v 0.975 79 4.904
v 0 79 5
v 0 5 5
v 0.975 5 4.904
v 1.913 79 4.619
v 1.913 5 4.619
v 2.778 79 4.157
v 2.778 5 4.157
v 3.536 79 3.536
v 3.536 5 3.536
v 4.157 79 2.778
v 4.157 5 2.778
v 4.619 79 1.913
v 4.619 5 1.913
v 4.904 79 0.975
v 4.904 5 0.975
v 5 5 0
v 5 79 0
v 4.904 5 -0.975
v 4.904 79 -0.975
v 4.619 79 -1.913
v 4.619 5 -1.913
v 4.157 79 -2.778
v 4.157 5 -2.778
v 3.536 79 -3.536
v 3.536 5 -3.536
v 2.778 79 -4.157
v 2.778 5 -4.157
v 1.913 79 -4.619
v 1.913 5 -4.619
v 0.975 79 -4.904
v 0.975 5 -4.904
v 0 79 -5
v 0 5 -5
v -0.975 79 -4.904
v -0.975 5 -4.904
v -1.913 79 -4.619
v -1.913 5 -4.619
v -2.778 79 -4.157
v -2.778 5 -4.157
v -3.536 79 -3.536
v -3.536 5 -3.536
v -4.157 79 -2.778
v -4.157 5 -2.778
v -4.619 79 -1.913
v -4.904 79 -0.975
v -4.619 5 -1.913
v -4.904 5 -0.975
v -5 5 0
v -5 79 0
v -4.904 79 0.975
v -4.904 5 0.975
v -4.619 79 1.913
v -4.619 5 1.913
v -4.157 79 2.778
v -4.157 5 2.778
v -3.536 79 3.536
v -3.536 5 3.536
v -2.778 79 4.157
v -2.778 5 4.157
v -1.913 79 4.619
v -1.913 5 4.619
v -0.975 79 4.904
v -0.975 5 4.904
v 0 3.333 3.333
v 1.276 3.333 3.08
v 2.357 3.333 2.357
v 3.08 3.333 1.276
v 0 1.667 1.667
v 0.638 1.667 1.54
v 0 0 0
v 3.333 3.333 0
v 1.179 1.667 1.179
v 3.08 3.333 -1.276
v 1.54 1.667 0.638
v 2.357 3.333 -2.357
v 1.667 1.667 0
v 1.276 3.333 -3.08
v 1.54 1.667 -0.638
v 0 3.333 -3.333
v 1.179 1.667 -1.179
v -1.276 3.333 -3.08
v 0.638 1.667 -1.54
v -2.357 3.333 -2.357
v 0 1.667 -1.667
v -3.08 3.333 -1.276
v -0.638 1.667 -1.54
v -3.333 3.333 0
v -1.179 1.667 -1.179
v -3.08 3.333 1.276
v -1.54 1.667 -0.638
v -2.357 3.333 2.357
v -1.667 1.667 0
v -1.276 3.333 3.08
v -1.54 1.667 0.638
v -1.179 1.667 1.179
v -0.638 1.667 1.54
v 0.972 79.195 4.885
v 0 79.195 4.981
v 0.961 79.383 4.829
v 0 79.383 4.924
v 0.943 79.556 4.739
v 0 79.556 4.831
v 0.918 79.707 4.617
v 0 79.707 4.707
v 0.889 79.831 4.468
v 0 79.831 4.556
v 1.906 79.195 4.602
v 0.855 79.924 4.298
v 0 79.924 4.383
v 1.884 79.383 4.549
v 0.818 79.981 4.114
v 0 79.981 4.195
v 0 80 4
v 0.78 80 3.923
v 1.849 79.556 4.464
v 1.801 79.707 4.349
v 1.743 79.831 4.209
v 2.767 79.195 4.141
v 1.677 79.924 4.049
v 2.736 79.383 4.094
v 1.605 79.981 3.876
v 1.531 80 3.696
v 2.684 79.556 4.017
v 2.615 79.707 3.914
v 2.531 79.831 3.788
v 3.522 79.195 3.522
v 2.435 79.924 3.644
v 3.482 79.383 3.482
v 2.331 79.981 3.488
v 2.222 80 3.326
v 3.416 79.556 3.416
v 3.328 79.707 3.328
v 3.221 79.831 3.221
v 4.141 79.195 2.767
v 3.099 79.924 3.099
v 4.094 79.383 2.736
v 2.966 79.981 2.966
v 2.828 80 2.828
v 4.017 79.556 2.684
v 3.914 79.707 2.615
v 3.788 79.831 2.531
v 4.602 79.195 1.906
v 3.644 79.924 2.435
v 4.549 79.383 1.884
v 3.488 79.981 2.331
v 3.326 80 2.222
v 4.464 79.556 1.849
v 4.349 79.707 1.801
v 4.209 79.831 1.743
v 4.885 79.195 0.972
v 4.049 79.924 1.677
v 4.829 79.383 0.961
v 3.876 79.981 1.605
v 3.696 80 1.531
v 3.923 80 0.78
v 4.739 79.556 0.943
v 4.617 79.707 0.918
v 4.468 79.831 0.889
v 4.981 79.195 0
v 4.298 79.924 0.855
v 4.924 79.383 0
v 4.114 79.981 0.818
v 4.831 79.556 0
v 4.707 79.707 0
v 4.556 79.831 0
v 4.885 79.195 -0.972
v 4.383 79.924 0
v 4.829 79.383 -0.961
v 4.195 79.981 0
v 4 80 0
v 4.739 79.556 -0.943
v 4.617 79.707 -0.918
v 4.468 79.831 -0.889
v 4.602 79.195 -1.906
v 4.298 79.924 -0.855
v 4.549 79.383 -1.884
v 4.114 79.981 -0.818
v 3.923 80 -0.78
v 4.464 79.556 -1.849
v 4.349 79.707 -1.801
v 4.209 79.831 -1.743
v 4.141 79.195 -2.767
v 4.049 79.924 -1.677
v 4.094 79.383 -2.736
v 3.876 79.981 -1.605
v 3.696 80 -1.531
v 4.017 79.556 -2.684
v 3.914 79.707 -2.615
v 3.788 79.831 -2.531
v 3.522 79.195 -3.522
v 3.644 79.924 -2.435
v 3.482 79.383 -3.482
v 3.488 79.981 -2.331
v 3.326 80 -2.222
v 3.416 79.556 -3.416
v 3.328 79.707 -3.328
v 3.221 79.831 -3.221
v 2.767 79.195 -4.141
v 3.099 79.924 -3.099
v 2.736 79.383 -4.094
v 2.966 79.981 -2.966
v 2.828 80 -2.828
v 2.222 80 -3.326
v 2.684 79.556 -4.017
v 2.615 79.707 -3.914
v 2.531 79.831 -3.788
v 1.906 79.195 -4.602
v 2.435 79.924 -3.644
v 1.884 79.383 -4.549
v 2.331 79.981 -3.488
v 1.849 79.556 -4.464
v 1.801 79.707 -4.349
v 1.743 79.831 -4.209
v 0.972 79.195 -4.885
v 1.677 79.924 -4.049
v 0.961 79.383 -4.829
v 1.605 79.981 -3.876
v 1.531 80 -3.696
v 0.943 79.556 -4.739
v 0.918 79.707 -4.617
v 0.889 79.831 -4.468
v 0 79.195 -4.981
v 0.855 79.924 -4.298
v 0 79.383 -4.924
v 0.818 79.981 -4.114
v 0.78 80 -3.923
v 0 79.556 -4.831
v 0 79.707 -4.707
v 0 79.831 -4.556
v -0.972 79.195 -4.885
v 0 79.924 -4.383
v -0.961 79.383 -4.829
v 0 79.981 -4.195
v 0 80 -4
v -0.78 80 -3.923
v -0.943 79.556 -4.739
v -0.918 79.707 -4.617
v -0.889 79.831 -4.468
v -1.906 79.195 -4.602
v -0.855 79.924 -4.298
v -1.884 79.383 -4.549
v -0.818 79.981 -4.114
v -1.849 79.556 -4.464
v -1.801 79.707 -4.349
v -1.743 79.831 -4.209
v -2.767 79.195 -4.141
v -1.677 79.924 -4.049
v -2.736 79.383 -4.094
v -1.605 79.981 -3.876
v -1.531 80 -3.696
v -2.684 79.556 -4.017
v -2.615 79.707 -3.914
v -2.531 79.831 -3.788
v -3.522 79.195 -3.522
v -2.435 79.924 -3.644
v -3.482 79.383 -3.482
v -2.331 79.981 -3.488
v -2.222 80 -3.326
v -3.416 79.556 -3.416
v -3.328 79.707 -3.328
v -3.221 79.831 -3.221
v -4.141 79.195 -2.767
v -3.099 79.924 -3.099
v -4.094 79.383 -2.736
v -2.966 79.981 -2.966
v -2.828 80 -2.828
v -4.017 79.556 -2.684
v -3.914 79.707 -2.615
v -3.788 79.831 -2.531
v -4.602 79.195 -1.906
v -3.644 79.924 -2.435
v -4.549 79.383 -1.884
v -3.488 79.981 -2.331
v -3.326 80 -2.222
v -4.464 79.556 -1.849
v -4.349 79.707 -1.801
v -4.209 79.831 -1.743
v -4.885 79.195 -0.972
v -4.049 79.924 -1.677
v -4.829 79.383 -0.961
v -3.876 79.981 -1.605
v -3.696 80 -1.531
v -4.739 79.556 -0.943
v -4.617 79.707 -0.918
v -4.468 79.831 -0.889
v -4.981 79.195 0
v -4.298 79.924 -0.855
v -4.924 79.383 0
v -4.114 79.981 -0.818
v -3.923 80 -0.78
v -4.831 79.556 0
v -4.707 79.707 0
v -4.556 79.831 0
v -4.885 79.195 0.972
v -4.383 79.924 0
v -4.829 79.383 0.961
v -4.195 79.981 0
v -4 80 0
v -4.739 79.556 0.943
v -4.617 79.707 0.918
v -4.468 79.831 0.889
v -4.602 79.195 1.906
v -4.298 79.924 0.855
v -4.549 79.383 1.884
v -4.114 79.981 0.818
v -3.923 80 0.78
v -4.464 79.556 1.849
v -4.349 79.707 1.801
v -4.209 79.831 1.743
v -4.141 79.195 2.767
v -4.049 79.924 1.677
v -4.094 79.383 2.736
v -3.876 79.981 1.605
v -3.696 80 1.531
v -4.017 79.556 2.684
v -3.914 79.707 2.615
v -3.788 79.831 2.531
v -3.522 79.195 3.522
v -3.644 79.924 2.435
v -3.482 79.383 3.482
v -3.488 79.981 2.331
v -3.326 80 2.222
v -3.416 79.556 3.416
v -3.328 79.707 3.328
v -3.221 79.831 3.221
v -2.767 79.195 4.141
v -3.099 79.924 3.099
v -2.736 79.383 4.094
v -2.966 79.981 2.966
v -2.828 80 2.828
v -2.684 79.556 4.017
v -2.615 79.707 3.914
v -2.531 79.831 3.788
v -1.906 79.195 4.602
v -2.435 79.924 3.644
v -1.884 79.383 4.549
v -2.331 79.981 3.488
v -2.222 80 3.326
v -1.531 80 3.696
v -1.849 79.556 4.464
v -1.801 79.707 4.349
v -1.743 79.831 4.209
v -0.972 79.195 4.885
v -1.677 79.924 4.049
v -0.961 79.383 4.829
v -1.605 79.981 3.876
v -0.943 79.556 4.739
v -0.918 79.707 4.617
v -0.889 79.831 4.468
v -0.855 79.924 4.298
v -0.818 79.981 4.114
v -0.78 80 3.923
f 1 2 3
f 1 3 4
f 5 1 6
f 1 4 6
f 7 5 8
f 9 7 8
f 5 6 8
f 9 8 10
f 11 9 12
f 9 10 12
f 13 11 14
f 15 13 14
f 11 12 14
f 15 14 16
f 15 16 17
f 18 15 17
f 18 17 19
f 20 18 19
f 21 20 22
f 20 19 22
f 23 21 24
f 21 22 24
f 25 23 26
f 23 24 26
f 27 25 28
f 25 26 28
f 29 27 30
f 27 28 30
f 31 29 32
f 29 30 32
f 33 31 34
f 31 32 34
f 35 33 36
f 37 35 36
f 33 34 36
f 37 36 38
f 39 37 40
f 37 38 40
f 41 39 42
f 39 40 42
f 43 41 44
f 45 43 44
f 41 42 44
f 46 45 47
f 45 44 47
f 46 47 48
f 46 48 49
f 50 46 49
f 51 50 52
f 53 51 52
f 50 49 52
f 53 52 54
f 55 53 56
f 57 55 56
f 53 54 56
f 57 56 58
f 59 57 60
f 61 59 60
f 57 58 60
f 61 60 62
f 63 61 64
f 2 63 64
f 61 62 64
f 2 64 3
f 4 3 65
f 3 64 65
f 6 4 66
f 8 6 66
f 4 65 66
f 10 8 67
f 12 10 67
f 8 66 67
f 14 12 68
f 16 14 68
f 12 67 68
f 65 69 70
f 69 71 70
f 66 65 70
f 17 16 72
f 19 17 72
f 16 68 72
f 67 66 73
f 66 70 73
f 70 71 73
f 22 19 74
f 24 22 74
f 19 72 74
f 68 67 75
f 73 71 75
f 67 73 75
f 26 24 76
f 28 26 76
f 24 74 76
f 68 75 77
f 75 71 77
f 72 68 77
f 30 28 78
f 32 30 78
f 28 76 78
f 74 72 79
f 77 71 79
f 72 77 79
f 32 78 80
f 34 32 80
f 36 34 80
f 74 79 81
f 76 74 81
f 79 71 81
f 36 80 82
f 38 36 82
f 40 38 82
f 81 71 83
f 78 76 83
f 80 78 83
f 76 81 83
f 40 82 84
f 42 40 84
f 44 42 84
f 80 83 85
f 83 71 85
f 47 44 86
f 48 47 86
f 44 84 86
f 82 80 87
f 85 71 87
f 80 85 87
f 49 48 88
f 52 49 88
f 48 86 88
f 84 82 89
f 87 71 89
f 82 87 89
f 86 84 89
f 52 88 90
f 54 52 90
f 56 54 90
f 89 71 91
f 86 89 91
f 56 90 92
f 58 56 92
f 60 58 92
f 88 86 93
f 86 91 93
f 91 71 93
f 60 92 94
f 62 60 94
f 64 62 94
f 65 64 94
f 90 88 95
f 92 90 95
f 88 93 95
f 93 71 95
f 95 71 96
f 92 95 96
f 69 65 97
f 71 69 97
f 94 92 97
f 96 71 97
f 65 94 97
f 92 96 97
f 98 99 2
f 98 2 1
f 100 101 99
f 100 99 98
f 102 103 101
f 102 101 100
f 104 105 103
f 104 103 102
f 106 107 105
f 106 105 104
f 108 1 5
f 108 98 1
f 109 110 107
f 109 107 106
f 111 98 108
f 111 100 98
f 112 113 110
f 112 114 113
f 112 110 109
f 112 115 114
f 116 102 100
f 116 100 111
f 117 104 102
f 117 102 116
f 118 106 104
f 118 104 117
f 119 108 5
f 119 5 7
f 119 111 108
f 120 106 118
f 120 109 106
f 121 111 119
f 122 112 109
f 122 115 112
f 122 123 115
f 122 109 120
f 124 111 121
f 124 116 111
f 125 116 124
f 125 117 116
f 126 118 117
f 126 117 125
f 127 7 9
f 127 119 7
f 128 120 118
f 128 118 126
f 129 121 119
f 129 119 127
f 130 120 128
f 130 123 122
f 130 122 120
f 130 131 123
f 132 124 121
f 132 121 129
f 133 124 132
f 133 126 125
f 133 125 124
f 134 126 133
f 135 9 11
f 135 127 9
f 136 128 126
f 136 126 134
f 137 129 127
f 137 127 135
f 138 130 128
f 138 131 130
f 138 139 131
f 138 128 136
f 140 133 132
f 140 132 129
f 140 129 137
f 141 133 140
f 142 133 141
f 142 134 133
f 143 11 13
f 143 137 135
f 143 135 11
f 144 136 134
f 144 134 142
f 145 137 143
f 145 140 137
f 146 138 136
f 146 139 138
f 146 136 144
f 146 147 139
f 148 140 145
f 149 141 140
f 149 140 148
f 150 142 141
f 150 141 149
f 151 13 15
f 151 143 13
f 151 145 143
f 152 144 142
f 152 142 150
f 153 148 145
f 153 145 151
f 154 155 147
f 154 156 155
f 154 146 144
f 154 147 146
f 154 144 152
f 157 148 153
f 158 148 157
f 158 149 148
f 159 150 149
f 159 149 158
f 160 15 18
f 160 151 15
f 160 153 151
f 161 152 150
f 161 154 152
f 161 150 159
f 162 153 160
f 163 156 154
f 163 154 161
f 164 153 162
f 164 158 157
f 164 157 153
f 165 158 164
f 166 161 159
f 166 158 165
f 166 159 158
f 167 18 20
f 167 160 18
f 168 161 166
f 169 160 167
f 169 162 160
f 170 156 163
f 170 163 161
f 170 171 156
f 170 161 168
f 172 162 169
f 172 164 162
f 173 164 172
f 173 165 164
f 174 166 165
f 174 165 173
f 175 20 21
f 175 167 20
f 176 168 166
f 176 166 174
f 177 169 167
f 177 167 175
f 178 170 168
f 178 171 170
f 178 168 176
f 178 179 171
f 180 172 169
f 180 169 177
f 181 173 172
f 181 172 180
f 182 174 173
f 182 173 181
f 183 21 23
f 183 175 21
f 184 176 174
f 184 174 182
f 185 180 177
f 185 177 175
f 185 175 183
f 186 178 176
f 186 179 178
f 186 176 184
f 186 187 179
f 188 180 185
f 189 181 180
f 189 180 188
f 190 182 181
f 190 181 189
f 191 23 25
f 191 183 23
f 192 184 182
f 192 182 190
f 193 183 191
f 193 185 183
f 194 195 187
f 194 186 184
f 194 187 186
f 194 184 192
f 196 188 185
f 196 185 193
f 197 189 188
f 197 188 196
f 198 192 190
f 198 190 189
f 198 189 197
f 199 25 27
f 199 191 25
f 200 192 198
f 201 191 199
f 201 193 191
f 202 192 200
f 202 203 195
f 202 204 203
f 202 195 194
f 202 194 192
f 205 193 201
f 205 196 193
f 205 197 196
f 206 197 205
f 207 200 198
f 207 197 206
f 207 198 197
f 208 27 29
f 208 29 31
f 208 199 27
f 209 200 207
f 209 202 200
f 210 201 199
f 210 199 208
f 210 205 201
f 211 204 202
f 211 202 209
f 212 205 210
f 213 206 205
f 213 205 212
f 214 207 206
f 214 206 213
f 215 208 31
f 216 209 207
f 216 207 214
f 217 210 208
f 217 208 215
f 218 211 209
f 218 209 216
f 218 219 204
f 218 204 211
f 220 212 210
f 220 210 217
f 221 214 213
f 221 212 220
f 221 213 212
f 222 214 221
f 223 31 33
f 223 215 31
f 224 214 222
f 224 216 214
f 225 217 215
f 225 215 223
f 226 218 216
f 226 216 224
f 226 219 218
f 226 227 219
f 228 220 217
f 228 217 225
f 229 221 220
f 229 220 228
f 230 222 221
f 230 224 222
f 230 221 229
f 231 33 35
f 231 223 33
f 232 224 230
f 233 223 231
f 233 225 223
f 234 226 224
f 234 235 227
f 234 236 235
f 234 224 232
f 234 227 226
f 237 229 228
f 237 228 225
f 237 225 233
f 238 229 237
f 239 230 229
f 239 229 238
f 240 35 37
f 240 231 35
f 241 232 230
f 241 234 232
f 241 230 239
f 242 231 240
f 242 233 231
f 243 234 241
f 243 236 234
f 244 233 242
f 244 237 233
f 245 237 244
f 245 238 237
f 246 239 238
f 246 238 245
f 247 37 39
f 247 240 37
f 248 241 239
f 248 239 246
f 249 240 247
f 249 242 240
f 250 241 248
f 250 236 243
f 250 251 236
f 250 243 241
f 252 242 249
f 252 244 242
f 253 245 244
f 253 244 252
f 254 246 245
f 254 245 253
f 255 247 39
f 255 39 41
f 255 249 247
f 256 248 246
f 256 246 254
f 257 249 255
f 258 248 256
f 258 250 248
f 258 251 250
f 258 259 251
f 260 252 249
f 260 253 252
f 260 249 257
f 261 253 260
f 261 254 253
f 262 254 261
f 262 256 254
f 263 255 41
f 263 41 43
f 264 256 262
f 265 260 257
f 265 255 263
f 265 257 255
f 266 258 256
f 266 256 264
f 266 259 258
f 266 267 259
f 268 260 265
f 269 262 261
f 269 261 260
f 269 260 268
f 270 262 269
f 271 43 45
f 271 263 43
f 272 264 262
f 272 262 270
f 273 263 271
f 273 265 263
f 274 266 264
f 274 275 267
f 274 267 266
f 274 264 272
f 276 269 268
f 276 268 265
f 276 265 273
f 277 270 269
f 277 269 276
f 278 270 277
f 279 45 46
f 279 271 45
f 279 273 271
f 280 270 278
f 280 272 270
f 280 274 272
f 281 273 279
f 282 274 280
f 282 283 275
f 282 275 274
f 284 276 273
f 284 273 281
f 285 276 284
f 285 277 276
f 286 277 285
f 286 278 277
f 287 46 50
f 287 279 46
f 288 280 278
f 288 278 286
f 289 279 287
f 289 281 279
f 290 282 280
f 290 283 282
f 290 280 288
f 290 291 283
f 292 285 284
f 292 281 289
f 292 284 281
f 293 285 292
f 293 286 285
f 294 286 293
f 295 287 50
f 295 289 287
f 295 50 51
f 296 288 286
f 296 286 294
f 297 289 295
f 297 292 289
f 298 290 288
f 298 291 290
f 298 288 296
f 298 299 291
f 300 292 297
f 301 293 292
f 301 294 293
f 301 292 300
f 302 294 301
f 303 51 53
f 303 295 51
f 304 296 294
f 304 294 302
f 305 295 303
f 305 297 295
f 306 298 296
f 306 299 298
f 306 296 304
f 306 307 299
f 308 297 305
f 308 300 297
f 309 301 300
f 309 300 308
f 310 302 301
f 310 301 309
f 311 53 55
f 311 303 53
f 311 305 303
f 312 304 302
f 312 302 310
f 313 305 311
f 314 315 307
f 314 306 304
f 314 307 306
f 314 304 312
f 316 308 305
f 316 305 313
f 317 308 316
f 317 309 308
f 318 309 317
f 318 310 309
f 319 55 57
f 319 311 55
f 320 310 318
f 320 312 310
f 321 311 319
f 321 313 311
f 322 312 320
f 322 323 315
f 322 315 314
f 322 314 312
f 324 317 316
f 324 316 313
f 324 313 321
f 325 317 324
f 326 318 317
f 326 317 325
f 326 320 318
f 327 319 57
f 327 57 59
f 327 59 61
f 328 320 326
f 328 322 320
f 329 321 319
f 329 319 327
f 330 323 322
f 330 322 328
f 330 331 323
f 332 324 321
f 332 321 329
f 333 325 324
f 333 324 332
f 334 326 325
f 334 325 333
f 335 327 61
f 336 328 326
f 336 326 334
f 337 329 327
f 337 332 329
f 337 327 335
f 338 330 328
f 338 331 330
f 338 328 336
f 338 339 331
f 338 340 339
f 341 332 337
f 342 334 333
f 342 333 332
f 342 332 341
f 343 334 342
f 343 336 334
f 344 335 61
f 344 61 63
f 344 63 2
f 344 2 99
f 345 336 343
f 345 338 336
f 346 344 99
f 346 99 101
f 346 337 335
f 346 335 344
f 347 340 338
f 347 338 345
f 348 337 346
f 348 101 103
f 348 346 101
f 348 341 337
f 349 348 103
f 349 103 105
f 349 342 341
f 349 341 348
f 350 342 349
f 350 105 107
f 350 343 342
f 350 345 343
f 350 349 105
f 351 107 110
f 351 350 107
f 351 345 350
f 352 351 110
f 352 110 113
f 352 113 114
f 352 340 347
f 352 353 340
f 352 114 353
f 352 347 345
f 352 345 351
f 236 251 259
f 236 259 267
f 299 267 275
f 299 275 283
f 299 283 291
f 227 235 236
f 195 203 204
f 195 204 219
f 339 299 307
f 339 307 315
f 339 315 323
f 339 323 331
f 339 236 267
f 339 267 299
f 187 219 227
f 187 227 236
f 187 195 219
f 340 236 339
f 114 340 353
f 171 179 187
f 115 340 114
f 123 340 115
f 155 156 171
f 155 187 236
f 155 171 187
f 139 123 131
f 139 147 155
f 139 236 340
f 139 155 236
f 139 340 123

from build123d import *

# Parameters (mm, degrees)
SKETCH1_R           = 5
BOSS_EXTRUDE1_DEPTH = 80
CHAMFER1_SIZE       = 5
FILLET1_R           = 1


with BuildPart() as part:
    # Sketch1 → Boss-Extrude1 (new body)
    with BuildSketch(Plane(origin=(0, 0, 0), x_dir=(1, 0, 0), z_dir=(0, 1, 0))):
        with Locations(Location((0, 0, 0), (0, 0, 270))):
            Circle(SKETCH1_R)
    extrude(amount=BOSS_EXTRUDE1_DEPTH)

    # Chamfer1
    chamfer1_edges = [part.edges().sort_by_distance(p)[0] for p in [
        (0, 0, -5),
    ]]
    chamfer(chamfer1_edges, length=CHAMFER1_SIZE)

    # Fillet1
    fillet1_edges = [part.edges().sort_by_distance(p)[0] for p in [
        (0, 80, -5),
    ]]
    fillet(fillet1_edges, radius=FILLET1_R)


solid = part.part
